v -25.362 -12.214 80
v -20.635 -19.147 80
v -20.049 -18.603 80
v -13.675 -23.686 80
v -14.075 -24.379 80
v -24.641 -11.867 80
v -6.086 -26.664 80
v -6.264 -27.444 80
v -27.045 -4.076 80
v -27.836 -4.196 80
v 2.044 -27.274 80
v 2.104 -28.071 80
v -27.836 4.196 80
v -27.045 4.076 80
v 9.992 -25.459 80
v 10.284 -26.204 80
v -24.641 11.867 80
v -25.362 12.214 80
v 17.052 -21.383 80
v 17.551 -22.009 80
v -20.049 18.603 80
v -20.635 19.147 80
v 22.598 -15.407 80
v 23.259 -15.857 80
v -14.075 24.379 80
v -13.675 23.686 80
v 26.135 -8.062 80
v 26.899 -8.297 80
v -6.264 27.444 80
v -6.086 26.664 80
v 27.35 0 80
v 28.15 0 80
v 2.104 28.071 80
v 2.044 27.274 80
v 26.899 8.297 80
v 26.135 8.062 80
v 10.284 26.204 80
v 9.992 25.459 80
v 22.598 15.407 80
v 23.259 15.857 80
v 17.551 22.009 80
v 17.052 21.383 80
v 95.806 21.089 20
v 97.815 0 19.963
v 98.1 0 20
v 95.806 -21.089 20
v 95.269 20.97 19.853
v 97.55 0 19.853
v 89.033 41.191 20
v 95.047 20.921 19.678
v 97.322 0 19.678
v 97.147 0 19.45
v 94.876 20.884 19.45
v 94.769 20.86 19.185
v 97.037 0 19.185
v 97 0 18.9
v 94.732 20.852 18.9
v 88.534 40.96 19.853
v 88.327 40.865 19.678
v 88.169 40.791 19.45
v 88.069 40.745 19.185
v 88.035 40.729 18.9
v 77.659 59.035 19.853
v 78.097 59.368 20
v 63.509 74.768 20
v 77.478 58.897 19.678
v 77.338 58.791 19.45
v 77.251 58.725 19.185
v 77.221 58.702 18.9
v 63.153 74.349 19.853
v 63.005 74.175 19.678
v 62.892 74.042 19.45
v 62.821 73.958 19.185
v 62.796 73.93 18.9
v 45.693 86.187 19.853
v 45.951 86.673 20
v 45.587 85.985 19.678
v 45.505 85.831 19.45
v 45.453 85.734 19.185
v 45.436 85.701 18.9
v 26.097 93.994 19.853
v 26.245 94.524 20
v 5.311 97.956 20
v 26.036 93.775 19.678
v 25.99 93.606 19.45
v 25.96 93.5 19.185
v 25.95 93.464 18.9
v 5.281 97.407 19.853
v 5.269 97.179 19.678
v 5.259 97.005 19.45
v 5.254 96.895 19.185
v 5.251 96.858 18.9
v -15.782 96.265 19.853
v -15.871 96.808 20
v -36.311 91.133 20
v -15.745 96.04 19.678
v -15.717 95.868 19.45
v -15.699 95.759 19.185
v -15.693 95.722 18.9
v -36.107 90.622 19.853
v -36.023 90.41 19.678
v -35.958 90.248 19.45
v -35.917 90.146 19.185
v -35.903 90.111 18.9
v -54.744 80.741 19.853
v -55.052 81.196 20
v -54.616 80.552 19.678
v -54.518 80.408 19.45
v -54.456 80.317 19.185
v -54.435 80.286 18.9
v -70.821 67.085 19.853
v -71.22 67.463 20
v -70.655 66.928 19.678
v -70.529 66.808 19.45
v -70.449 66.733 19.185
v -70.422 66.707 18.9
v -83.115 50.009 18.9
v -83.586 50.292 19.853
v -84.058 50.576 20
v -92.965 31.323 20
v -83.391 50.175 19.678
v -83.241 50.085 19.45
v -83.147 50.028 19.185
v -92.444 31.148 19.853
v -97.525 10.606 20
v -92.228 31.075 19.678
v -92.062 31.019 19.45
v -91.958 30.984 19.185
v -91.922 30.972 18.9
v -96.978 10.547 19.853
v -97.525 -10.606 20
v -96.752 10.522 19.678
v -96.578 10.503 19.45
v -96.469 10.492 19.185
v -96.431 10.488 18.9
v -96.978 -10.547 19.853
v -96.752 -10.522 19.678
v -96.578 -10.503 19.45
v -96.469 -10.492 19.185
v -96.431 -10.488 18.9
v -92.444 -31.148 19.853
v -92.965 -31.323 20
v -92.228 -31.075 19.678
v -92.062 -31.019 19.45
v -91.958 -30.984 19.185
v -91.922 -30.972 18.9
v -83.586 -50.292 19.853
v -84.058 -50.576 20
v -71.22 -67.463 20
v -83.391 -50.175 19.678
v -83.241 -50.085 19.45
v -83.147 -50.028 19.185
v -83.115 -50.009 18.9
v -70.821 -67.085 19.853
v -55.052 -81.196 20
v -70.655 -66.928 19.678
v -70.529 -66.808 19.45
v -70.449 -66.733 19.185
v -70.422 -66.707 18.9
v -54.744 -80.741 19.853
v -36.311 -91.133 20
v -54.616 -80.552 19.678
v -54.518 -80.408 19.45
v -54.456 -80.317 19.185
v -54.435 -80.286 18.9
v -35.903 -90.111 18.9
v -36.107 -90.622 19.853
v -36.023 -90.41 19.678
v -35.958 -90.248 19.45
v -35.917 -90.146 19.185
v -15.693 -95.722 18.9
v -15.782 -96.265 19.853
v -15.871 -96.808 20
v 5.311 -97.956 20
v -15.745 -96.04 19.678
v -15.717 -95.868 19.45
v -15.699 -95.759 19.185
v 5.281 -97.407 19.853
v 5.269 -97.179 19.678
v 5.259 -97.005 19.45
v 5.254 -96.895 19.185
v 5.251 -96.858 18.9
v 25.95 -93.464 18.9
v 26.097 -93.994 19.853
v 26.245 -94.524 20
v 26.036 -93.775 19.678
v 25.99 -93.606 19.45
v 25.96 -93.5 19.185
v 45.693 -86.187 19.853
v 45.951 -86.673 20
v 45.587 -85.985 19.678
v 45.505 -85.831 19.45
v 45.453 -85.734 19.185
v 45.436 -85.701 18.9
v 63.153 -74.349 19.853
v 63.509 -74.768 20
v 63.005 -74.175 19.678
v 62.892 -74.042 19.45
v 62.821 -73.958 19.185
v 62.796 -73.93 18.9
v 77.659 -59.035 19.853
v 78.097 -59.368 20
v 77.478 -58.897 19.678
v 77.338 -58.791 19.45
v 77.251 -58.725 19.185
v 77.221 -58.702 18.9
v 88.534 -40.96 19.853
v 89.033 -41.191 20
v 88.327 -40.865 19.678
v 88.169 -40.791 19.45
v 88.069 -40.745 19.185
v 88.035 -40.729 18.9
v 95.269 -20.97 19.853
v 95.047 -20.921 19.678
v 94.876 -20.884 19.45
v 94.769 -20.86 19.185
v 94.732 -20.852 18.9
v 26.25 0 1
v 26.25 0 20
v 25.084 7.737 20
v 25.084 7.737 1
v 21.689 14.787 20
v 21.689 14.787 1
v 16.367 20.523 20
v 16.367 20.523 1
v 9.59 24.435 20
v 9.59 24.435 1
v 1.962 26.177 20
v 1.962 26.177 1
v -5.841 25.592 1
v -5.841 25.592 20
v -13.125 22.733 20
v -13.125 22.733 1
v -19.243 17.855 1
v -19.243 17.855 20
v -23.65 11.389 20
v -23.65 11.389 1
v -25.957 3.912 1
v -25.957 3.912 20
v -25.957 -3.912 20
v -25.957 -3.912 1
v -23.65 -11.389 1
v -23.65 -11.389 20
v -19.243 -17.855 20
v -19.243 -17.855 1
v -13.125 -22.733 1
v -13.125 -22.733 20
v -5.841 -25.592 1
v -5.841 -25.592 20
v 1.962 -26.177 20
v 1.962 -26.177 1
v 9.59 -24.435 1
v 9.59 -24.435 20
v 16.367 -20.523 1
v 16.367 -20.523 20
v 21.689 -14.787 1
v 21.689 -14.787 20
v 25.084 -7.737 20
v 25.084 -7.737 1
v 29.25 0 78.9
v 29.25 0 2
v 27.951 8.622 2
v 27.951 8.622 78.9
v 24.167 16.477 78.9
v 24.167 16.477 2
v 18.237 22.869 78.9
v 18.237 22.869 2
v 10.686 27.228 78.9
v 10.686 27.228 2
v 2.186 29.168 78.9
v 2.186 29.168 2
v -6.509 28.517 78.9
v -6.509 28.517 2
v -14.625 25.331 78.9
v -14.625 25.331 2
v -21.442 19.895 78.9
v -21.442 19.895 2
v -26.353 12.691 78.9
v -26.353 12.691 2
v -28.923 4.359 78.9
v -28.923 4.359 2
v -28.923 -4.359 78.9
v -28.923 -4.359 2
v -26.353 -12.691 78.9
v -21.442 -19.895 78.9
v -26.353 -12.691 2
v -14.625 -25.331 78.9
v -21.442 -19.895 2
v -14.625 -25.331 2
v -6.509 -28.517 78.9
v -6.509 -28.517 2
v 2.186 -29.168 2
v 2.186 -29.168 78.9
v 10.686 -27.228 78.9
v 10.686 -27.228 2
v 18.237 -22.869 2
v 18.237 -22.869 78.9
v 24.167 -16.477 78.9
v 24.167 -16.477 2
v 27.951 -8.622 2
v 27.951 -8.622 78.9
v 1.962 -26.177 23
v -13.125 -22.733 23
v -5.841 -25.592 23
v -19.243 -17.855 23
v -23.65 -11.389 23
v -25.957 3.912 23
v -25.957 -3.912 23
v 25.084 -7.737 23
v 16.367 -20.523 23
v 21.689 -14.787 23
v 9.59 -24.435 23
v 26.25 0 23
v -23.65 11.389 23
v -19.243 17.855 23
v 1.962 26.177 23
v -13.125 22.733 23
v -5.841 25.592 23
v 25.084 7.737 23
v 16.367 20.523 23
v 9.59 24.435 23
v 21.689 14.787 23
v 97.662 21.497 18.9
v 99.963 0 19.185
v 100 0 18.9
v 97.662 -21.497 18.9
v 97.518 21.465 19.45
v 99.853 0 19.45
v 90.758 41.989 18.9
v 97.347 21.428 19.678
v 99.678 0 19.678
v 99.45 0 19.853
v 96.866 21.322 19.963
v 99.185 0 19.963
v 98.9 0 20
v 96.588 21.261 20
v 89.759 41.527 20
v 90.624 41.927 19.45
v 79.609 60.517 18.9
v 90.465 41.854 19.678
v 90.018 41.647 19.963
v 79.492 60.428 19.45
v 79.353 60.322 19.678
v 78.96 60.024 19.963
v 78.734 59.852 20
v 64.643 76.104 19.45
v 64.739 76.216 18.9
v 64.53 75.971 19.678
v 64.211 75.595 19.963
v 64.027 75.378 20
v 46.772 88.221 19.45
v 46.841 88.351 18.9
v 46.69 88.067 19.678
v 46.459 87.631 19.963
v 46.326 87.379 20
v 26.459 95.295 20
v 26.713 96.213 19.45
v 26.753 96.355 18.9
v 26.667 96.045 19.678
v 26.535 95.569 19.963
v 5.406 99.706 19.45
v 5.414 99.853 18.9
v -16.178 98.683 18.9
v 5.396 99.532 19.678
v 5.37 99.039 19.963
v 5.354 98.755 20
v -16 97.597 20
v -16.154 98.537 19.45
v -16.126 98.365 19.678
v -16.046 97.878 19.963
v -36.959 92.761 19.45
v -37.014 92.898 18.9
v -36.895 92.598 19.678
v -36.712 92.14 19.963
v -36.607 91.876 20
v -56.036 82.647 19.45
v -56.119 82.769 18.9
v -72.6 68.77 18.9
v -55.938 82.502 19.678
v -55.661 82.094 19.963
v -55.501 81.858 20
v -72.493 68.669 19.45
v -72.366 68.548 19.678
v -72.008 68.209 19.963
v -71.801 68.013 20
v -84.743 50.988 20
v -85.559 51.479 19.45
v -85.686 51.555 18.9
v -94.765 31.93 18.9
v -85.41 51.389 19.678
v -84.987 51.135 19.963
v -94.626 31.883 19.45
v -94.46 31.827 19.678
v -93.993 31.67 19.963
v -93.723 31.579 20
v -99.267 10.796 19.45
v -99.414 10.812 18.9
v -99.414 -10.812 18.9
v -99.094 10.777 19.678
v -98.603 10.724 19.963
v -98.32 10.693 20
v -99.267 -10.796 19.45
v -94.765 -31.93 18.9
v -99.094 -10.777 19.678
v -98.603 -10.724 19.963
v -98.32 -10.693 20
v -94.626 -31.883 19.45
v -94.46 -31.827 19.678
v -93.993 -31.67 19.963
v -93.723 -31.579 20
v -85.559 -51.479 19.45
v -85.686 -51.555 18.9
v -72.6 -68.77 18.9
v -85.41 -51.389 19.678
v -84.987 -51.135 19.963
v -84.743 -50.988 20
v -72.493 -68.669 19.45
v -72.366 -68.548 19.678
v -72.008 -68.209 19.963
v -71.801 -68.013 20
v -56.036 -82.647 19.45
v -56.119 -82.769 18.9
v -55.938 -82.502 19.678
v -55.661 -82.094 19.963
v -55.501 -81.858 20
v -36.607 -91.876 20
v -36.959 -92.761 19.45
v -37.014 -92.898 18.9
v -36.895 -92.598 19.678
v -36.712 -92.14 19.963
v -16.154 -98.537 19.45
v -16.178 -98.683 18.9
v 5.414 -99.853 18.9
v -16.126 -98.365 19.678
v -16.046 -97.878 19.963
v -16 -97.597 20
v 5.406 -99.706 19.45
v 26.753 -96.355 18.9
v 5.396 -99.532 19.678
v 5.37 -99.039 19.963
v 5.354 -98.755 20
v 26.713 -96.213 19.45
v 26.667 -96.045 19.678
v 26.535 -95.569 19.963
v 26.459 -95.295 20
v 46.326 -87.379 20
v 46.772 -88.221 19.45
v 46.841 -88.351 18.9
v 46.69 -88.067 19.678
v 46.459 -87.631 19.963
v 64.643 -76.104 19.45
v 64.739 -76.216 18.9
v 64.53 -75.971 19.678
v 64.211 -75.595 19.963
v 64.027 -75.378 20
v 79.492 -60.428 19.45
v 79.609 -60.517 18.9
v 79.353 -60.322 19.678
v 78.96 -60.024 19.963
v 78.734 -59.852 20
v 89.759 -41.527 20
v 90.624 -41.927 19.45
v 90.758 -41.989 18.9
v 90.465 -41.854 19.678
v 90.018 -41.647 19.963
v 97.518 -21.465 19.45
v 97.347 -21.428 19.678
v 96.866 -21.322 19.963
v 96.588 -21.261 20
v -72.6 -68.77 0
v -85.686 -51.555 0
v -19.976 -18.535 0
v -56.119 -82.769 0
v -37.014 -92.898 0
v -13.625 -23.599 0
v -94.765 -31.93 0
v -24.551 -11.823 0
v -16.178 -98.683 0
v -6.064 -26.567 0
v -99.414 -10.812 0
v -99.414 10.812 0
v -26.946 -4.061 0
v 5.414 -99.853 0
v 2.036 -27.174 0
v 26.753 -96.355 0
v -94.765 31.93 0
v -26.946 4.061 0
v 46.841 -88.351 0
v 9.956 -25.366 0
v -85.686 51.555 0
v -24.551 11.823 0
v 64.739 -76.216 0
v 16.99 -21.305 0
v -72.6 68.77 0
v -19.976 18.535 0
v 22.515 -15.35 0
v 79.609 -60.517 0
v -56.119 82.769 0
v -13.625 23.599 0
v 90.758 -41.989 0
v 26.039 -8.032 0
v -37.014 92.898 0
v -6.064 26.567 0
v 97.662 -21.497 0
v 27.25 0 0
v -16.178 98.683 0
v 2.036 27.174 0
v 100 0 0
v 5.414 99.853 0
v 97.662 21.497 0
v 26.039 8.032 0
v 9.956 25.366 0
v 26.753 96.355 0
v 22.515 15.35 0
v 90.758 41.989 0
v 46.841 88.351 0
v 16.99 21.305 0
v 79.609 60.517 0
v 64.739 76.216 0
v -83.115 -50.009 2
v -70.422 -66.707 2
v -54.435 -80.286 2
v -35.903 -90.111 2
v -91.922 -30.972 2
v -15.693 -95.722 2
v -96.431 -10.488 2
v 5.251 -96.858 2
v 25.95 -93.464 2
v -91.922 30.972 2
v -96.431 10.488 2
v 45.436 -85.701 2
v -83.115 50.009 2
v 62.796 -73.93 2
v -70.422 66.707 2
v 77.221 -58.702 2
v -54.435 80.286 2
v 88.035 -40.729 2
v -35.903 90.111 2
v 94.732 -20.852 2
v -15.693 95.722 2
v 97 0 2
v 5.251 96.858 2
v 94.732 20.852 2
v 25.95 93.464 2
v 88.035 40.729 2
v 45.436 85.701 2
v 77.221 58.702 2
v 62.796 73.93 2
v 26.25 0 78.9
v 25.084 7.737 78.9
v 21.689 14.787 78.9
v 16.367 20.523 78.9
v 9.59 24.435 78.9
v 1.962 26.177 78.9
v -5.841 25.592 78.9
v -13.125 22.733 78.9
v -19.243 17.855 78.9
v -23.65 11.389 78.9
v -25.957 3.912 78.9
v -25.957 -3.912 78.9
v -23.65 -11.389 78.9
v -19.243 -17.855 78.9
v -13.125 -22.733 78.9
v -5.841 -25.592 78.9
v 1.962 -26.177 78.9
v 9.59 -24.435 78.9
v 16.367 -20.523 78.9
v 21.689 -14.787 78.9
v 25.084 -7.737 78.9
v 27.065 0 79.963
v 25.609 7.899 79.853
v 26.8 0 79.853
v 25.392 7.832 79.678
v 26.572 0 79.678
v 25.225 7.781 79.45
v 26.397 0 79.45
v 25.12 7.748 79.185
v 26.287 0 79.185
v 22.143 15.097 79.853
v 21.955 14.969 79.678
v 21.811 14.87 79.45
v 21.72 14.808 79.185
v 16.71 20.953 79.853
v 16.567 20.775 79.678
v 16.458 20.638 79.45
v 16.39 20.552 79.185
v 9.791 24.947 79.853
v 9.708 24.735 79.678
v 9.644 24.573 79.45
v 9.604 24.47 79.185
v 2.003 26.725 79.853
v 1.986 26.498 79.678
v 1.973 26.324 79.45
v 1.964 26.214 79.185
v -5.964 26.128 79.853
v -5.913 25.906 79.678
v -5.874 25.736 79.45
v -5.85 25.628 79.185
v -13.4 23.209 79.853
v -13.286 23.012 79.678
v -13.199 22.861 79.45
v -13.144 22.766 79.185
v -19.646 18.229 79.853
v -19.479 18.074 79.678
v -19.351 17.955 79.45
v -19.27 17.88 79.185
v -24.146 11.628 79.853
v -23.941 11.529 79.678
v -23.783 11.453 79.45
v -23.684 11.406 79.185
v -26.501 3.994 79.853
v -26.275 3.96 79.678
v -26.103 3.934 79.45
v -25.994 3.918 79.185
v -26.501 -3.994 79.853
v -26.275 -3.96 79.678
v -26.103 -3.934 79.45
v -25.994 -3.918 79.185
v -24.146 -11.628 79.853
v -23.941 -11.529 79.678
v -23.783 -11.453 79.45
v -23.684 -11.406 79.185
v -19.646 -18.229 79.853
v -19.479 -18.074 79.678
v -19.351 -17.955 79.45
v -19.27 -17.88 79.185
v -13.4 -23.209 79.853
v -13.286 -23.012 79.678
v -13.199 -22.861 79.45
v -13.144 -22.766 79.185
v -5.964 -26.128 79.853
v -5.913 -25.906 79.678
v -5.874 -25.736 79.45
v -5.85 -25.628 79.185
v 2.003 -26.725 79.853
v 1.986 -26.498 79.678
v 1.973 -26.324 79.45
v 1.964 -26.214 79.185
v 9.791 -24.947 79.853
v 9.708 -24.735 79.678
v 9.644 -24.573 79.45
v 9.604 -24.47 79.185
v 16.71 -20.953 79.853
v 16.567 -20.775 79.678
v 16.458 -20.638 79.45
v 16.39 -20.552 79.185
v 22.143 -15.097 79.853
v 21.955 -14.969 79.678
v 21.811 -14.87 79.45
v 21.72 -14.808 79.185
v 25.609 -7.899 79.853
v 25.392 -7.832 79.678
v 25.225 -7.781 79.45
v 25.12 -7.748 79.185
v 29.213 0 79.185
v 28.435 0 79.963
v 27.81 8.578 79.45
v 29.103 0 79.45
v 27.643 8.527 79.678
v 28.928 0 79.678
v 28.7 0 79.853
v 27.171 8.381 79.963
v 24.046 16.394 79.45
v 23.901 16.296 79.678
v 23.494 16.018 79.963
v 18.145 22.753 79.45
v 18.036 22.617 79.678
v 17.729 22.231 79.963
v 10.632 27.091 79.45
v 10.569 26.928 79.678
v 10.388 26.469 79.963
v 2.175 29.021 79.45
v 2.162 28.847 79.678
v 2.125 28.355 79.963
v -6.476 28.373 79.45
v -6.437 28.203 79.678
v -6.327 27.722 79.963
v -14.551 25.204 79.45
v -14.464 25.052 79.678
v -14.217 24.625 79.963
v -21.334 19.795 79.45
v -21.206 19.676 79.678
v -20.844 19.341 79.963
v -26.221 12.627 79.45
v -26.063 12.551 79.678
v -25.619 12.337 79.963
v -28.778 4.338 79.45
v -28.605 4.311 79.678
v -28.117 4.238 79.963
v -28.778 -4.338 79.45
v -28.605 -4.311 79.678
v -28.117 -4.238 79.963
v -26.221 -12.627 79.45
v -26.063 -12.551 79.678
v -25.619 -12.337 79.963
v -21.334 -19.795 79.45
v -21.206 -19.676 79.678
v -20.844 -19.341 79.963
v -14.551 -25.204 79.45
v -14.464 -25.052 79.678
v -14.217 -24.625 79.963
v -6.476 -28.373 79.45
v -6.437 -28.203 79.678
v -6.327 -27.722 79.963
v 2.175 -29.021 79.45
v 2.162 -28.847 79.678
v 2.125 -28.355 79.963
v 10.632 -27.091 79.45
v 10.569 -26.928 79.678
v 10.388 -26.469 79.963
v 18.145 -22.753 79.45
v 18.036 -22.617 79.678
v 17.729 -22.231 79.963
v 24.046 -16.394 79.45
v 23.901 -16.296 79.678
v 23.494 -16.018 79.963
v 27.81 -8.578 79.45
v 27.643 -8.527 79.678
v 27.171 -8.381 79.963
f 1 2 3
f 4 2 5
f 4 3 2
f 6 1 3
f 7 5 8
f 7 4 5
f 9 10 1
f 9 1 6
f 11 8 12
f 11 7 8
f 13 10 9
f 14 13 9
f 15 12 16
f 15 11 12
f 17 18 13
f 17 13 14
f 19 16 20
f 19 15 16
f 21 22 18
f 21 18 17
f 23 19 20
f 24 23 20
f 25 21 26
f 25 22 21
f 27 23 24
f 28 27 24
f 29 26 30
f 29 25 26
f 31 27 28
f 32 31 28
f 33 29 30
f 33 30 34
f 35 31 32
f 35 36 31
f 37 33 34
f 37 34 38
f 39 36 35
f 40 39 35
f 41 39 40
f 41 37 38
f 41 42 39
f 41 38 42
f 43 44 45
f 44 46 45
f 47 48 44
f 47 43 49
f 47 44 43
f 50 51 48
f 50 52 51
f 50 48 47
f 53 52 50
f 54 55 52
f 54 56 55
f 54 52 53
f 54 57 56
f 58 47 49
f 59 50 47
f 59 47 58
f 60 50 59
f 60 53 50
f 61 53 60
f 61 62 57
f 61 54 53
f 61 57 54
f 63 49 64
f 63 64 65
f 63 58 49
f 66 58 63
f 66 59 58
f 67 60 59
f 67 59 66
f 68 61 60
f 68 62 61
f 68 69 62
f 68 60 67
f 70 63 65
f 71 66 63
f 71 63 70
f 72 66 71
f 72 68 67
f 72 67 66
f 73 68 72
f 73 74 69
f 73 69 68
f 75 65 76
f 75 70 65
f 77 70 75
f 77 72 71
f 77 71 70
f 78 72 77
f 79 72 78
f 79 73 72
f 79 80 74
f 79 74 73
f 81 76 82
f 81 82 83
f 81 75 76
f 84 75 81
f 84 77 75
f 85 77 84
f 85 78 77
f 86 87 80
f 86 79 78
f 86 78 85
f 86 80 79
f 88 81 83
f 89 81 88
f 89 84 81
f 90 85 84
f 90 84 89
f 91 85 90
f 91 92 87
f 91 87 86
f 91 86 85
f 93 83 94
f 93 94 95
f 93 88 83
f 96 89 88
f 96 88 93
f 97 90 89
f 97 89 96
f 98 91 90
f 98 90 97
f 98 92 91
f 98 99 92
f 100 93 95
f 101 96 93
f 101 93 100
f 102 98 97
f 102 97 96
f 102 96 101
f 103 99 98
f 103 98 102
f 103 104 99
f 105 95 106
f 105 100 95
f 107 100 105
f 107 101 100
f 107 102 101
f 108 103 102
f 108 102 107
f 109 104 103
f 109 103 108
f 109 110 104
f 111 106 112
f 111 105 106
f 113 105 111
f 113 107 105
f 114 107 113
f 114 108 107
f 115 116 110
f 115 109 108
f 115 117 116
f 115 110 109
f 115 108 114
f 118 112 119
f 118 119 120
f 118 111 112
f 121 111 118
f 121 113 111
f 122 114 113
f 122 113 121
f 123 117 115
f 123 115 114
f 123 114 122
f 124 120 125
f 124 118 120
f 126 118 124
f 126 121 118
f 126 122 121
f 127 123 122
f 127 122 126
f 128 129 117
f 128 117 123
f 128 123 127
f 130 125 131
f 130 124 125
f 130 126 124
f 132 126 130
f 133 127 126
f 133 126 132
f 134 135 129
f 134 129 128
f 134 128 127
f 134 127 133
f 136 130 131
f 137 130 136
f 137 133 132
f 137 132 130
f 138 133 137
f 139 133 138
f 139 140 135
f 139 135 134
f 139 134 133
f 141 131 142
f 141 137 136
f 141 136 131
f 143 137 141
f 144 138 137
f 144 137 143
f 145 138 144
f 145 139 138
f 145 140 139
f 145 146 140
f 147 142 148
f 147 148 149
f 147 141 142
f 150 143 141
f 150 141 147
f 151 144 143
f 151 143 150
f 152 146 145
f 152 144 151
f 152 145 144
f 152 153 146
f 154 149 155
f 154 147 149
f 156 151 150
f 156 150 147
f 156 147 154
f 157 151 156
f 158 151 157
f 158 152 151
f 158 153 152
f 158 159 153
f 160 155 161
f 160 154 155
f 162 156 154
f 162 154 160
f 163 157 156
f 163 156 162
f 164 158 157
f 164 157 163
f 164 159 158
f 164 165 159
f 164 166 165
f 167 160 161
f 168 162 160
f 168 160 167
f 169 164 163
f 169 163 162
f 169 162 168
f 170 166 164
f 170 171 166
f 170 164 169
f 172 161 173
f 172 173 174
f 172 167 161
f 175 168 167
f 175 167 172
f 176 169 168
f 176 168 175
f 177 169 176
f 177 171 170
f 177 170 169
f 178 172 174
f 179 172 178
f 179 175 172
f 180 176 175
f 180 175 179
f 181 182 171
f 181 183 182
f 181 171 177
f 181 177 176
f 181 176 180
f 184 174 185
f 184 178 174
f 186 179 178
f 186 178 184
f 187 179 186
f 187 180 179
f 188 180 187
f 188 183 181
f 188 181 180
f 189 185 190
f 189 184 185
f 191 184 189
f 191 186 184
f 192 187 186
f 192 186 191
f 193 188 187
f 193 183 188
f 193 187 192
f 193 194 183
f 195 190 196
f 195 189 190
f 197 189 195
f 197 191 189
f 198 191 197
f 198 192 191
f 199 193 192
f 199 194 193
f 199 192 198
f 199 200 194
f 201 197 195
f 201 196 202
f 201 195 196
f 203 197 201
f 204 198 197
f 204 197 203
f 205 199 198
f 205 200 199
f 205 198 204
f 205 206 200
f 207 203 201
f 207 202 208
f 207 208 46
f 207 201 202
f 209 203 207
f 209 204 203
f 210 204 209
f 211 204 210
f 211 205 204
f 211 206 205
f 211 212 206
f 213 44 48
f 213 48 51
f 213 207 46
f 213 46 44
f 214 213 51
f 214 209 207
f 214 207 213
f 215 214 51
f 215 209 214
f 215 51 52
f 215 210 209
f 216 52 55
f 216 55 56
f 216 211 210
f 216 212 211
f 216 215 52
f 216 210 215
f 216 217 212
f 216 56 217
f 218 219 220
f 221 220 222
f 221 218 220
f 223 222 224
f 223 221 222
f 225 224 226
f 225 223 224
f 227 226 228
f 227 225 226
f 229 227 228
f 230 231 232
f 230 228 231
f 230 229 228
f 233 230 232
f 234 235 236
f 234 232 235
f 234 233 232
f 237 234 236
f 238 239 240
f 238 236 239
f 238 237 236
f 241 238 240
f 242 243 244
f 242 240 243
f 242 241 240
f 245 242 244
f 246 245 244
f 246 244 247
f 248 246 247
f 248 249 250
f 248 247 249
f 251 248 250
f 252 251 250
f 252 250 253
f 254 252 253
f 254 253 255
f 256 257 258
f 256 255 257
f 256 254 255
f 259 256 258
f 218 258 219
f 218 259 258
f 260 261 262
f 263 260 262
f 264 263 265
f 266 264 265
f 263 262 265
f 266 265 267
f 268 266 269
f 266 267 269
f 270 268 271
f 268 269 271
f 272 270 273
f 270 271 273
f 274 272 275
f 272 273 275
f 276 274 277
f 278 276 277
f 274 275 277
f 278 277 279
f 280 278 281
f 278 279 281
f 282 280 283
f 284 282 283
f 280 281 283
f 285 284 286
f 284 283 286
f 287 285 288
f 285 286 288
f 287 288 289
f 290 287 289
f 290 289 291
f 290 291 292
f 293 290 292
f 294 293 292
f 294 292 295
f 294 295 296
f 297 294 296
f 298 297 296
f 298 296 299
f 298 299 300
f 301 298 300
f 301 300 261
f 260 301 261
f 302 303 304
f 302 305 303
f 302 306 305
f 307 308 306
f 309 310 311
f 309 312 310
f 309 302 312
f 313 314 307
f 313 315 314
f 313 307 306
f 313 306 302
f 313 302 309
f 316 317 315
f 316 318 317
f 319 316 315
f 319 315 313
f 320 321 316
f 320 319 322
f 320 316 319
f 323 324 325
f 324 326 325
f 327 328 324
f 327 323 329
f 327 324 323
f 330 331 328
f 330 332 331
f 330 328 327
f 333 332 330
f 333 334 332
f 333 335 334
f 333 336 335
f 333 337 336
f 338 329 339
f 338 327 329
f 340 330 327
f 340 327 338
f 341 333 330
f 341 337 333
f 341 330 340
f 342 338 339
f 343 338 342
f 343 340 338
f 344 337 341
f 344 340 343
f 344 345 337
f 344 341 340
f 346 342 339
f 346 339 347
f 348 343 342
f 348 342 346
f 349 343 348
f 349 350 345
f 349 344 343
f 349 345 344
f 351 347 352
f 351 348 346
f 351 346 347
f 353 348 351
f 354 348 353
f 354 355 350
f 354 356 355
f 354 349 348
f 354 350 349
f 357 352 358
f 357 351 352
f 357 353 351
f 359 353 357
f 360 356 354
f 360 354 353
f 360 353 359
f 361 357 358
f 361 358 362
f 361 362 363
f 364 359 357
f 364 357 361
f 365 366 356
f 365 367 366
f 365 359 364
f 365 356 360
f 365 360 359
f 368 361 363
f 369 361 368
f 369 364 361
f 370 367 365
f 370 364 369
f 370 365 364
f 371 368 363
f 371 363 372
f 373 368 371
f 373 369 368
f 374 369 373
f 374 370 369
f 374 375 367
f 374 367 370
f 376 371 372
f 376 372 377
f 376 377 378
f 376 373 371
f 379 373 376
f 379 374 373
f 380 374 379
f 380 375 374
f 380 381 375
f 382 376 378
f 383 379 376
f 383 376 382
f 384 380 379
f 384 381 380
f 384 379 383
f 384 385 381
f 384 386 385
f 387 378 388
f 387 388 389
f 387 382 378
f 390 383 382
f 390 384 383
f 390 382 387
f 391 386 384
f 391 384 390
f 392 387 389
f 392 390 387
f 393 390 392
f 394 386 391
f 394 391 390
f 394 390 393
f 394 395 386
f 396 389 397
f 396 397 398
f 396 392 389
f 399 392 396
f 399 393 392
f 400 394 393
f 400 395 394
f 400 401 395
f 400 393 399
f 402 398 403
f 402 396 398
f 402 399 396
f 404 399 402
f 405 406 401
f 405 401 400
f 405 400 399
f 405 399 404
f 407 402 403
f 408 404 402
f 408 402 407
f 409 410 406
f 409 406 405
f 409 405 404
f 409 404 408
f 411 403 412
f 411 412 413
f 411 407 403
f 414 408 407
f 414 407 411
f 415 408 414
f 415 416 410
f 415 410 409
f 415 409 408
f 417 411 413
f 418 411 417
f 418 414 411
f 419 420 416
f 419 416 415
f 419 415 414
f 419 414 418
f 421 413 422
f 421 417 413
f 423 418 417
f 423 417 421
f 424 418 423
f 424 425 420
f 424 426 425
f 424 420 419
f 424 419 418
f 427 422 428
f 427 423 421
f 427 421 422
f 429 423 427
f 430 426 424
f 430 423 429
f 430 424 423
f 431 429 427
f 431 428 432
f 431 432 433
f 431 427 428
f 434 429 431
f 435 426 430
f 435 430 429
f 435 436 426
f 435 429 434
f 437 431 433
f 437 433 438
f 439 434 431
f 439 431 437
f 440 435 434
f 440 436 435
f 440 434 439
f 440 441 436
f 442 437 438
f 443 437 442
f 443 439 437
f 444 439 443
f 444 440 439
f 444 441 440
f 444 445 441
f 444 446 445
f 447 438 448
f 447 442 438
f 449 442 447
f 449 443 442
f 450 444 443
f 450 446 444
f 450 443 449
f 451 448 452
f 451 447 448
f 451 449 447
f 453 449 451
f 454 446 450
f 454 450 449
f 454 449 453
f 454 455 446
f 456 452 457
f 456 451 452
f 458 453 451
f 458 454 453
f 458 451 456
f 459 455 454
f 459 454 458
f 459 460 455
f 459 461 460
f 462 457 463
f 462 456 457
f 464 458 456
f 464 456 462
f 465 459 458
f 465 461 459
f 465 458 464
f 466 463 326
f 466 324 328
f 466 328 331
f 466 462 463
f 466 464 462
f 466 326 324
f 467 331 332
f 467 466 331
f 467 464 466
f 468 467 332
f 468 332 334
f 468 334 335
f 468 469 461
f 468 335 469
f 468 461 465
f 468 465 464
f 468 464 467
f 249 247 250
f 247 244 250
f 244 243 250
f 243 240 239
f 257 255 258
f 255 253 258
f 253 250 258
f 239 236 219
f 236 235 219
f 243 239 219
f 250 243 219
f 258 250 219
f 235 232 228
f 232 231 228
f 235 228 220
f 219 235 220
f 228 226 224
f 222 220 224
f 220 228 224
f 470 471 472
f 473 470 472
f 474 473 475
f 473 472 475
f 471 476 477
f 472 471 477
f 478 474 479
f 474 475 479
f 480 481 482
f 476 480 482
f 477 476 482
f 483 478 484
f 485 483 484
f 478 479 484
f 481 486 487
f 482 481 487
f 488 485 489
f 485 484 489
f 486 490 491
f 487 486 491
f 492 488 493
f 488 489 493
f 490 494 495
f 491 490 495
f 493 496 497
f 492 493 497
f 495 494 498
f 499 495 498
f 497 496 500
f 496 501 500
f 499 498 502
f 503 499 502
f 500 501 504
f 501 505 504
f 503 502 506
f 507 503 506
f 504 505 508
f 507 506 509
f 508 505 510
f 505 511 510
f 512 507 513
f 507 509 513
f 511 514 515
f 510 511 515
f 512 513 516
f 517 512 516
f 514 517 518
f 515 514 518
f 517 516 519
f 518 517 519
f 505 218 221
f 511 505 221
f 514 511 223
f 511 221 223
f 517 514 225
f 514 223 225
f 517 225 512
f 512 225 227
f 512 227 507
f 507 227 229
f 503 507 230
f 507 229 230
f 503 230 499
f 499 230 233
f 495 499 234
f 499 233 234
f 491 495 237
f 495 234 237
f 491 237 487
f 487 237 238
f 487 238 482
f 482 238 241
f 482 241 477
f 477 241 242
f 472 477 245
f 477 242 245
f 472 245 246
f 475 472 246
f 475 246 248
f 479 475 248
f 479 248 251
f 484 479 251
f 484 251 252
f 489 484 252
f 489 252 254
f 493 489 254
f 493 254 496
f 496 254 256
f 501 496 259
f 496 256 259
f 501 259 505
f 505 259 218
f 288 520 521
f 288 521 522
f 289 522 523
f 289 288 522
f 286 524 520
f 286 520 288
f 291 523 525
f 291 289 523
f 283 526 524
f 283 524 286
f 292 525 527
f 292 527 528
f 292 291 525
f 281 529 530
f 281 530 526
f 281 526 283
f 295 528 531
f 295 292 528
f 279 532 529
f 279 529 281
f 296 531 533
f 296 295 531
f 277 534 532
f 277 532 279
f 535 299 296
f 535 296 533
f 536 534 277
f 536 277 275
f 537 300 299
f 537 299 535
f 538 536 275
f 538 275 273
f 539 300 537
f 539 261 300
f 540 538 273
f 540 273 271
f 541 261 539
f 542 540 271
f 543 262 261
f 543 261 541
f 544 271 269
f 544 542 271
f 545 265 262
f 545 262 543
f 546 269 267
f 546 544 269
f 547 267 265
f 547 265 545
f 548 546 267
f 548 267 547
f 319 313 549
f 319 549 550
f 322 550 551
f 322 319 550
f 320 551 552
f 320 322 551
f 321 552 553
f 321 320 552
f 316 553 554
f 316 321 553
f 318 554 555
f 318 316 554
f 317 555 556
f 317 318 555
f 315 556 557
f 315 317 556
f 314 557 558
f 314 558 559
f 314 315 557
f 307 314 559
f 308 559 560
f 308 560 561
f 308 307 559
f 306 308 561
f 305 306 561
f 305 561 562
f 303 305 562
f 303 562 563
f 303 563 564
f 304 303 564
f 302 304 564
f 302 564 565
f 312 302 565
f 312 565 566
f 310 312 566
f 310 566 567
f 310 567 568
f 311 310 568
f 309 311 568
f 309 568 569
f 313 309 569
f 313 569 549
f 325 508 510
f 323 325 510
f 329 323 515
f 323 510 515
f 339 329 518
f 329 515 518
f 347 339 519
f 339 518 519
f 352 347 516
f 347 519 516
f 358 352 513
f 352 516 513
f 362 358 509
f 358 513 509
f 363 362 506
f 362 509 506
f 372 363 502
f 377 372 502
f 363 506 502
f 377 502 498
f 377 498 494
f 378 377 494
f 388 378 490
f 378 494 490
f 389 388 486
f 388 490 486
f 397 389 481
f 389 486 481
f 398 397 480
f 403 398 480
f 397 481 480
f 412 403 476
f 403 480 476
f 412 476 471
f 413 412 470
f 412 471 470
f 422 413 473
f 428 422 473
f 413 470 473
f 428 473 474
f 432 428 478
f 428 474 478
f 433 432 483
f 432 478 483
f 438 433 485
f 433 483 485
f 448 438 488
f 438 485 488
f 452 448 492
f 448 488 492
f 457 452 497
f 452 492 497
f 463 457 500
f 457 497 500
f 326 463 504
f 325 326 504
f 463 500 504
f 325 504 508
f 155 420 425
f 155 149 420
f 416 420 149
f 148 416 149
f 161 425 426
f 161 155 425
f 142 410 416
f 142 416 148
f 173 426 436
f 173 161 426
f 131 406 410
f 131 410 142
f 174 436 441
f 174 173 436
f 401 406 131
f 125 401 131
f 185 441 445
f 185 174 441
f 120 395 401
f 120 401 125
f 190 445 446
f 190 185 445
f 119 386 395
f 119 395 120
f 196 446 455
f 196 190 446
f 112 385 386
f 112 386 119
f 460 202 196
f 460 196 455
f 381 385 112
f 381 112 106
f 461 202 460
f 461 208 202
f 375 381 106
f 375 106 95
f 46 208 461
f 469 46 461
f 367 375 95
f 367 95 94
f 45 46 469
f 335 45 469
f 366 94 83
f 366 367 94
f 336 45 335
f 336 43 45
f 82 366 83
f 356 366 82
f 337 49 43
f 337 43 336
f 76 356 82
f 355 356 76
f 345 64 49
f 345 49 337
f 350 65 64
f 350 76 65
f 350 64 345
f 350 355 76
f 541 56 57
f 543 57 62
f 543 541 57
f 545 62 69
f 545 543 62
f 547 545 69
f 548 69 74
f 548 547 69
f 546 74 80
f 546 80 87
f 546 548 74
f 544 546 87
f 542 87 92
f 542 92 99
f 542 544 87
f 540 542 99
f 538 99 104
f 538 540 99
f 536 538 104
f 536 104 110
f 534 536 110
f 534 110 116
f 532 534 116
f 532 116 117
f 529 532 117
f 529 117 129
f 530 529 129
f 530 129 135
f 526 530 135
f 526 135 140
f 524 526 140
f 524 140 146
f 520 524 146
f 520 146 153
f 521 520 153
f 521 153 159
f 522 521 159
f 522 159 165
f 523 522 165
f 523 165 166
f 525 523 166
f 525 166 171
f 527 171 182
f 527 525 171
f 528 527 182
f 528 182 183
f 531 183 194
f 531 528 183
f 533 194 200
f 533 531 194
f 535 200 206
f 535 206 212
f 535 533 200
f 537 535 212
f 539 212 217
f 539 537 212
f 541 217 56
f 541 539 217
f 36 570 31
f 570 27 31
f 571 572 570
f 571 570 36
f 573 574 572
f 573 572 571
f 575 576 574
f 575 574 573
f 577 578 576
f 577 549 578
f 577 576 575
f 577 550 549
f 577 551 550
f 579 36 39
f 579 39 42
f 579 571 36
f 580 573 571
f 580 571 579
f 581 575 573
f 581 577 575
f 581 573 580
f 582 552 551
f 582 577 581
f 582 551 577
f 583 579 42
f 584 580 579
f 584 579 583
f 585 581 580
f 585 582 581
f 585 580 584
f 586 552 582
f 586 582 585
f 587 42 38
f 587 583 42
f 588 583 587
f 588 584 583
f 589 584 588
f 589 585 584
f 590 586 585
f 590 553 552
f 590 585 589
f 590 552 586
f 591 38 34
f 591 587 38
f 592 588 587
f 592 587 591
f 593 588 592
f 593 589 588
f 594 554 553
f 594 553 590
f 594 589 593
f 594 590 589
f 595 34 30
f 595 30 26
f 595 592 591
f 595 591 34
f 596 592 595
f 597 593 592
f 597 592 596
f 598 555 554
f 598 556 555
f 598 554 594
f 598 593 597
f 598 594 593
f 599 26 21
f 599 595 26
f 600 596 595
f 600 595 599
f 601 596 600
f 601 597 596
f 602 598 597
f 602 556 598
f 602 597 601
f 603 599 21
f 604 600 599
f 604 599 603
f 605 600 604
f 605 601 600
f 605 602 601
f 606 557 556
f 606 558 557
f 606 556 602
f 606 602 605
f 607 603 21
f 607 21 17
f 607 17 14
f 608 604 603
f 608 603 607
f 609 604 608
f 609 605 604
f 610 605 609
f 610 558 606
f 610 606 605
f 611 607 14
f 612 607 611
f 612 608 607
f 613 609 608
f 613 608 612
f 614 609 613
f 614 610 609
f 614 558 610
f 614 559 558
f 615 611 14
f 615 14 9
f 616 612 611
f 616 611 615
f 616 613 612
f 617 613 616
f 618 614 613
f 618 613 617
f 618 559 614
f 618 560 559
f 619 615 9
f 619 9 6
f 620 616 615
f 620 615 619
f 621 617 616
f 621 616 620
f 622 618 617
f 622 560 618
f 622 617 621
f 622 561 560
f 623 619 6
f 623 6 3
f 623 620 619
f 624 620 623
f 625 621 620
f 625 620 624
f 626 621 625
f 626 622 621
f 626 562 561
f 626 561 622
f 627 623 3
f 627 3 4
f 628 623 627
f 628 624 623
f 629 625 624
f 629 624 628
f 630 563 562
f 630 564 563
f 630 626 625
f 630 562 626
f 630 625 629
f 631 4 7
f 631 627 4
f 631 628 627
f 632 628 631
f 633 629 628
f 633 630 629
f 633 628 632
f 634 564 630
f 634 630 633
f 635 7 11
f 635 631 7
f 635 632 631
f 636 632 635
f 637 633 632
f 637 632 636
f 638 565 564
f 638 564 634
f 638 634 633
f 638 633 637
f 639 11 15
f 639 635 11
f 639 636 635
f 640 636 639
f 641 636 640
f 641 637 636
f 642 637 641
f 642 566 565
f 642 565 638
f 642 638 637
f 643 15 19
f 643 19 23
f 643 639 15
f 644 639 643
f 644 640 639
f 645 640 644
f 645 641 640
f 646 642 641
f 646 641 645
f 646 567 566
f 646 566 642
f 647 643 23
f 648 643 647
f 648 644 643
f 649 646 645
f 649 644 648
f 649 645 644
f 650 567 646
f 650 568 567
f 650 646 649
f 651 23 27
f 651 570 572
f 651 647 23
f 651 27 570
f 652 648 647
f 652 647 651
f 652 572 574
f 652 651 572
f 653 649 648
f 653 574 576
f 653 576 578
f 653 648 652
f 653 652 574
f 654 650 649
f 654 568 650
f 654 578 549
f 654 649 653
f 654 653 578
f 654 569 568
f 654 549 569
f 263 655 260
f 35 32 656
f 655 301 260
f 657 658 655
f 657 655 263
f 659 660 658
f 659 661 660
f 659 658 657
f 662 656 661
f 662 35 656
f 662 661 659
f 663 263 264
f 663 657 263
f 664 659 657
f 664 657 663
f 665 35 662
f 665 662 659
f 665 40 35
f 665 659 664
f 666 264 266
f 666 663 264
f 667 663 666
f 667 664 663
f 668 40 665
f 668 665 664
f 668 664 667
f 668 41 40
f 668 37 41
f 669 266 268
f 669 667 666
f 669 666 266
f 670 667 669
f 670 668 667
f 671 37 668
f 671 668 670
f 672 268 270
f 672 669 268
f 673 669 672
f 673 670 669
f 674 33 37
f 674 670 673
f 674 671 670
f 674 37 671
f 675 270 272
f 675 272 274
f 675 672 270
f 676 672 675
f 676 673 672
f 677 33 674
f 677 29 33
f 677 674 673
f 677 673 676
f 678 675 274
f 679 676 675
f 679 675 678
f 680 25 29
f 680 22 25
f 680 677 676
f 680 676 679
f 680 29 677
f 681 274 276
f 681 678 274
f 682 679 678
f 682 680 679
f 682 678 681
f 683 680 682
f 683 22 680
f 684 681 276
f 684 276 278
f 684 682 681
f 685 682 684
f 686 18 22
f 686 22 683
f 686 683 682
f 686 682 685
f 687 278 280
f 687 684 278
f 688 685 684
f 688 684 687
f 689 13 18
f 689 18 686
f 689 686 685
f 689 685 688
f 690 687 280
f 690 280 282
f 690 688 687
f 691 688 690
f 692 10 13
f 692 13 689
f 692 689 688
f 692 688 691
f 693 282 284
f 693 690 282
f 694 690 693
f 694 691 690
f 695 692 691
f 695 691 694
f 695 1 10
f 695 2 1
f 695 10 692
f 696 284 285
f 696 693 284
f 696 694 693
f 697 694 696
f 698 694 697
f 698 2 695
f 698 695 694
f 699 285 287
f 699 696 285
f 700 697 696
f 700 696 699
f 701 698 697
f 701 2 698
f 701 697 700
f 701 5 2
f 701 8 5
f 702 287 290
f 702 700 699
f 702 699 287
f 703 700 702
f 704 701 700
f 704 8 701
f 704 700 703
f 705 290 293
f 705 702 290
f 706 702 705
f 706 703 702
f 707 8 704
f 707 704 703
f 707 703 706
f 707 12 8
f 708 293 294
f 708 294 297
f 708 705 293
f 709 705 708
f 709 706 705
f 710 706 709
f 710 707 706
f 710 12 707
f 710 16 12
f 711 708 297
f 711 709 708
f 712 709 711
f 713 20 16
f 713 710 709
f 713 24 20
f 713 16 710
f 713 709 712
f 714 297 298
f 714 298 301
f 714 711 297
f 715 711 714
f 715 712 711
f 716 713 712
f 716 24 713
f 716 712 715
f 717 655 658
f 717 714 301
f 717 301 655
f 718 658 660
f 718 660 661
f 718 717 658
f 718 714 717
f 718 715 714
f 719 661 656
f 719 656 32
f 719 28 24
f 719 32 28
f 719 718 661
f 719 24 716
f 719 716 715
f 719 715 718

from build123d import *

# Parameters (mm, degrees)
F0_R     = 97
F0_R_2   = 29.25
F1_DEPTH = 2
F0_R_3   = 100
F2_DEPTH = 20
F0_R_4   = 26.25
F3_DEPTH = 80
F5_R     = 27.25
F6_DEPTH = 3
F7_R     = 1.1
F8_SIZE  = 1


with BuildPart() as f1:
    # F0 (on Top) → F1 (new body)
    with BuildSketch(Plane.XY):
        Circle(F0_R)
        Circle(F0_R_2, mode=Mode.SUBTRACT)
    extrude(amount=F1_DEPTH)

    # F0 (on Top) → F2 (join)
    with BuildSketch(Plane.XY):
        Circle(F0_R_3)
        Circle(F0_R, mode=Mode.SUBTRACT)
    extrude(amount=F2_DEPTH)

    # F0 (on Top) → F3 (join)
    with BuildSketch(Plane.XY):
        Circle(F0_R_2)
        Circle(F0_R_4, mode=Mode.SUBTRACT)
    extrude(amount=F3_DEPTH)

    # F5 (on offset) → F6 (join)
    with BuildSketch(Plane.XY.offset(20)):
        Circle(F5_R)
    extrude(amount=F6_DEPTH)

    # F7
    f7_edges = [f1.edges().sort_by_distance(p)[0] for p in [
        (-100, 0, 20),
        (-97, 0, 20),
        (-29.25, 0, 80),
        (-26.25, 0, 80),
    ]]
    fillet(f7_edges, radius=F7_R)

    # F8
    f8_edges = [f1.edges().sort_by_distance(p)[0] for p in [
        (-26.25, 0, 0),
    ]]
    chamfer(f8_edges, length=F8_SIZE)


solid = f1.part
